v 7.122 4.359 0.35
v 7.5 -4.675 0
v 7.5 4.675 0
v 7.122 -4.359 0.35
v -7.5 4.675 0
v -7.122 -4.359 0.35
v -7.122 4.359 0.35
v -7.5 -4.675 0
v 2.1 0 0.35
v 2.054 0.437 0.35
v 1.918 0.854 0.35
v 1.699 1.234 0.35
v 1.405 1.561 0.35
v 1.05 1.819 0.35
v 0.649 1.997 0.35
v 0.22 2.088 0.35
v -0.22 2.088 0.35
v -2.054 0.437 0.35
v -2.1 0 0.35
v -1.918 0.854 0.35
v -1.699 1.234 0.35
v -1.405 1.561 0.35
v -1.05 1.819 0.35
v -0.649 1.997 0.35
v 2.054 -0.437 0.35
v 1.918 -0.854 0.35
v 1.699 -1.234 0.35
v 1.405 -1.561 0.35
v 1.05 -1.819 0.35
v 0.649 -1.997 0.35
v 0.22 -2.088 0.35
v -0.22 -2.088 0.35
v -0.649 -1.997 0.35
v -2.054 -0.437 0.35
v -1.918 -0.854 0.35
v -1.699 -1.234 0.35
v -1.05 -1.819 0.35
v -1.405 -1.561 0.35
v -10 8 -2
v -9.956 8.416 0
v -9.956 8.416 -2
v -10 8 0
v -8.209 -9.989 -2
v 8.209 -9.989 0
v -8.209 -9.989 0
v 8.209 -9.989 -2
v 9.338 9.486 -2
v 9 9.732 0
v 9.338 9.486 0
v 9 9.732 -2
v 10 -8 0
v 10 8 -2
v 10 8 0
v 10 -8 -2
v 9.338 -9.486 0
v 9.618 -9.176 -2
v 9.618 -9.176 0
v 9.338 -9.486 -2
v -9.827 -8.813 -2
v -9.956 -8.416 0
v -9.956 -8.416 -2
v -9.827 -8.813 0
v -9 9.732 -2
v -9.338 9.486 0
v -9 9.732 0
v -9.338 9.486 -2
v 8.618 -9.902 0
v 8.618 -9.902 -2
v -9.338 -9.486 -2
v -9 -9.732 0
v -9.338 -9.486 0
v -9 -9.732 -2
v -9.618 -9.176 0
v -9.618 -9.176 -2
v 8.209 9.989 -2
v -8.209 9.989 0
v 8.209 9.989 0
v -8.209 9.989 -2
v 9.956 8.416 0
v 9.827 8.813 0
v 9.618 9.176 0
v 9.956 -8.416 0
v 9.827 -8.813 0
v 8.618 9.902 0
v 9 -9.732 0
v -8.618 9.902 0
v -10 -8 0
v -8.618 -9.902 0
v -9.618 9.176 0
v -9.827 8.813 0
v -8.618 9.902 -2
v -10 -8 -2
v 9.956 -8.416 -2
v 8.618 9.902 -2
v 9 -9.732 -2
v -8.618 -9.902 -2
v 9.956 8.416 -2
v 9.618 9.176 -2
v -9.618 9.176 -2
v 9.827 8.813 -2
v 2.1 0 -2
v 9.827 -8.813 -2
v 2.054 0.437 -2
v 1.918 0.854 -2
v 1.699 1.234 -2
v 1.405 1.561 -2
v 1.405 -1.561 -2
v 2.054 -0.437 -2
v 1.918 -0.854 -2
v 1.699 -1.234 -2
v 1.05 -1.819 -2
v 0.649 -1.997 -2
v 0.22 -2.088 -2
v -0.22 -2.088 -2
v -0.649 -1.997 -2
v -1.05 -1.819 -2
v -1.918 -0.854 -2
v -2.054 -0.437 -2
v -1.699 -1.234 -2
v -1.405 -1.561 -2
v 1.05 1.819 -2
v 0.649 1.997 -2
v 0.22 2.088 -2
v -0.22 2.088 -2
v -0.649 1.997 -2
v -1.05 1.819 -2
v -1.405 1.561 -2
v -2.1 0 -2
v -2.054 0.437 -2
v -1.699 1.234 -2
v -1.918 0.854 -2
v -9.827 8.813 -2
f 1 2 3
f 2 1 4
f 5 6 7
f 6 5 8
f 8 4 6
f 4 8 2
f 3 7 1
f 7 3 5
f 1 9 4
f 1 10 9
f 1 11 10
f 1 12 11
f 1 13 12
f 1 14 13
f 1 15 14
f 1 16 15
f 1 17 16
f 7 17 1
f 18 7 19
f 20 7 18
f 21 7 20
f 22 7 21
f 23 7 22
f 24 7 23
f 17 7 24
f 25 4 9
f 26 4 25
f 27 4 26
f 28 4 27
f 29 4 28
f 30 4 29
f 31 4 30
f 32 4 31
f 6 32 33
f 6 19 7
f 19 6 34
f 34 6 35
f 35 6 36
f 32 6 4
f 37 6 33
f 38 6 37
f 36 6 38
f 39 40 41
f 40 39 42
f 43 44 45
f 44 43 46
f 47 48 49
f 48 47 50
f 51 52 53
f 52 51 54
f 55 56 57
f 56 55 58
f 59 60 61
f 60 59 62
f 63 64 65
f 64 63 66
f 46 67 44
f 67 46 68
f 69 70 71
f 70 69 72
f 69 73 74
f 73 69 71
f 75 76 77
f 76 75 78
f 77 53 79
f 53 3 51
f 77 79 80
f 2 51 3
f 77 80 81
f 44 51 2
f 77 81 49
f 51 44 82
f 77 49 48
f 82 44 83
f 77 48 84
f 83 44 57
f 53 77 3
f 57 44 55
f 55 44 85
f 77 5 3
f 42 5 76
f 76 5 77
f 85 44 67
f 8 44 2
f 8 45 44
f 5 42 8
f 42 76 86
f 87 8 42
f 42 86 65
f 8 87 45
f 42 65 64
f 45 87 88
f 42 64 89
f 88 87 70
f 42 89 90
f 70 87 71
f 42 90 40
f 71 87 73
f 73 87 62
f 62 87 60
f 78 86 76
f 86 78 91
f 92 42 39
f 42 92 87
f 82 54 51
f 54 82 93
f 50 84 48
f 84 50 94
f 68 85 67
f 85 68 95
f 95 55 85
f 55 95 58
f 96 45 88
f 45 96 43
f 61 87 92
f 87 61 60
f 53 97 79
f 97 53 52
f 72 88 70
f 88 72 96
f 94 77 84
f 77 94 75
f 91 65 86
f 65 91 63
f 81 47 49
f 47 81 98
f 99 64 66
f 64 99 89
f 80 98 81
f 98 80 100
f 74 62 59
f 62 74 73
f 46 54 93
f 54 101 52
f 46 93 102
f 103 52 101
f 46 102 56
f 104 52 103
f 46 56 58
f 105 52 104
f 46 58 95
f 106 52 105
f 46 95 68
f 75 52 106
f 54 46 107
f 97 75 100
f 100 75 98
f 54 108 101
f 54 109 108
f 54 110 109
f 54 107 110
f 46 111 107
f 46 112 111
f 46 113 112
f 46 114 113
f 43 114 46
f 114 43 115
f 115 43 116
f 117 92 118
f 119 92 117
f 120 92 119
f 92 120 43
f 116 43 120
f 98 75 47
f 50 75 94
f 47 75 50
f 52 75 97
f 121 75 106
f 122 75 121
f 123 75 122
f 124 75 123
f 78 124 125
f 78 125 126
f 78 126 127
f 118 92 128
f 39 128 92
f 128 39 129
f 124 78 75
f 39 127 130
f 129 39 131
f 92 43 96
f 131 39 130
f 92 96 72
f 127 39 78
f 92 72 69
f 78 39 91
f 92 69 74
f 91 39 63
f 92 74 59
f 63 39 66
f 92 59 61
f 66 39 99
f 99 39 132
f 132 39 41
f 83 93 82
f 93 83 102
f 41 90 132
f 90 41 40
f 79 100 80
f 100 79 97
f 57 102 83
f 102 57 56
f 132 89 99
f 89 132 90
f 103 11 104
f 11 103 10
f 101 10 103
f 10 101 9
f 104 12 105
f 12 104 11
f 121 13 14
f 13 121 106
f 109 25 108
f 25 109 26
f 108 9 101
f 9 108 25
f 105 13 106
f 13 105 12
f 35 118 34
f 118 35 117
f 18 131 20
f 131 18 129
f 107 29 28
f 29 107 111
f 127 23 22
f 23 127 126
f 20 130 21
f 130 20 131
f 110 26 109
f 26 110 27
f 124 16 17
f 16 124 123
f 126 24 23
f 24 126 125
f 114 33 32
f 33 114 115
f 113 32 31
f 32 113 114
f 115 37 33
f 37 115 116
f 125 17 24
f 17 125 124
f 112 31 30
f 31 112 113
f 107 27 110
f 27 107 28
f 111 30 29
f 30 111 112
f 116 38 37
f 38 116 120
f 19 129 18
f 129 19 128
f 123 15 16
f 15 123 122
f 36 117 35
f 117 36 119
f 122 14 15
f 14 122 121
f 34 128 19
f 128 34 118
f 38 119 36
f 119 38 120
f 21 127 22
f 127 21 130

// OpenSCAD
// file: library.scad
////////////////////////////////////////////////////////////////////////////////////////////////////
module plate4Point(x,y,z,d){
	hull(){
		color("green") translate([(x/2)-(d/2) ,(y/2) -(d/2),0]) cylinder(h=z, d=d, center=true);
		color("blue")  translate([(x/2)-(d/2) ,-(y/2)+(d/2),0]) cylinder(h=z, d=d, center=true);
		color("red")   translate([-(x/2)+(d/2),(y/2) -(d/2),0]) cylinder(h=z, d=d, center=true);
		color("grey")  translate([-(x/2)+(d/2),-(y/2)+(d/2),0]) cylinder(h=z, d=d, center=true);
	}
}
////////////////////////////////////////////////////////////////////////////////////////////////////
module plate2Point(x,z,d){
	hull(){
		color("green") translate([(x/2) -(d/2),0 ,0]) cylinder(h=z, d=d, center=true);
		color("blue")  translate([-(x/2)+(d/2),0 ,0]) cylinder(h=z, d=d, center=true);
	}
}
////////////////////////////////////////////////////////////////////////////////////////////////////
module triagleSphere(iX, iY, iZ, iD){
	
	halfD = iD/2;
	hull(){
		color("red")		translate([-halfD   , (iY/2)-halfD, halfD]) sphere(d=iD);	
		color("grey")		translate([-iX+halfD, (iY/2)-halfD, halfD]) sphere(d=iD);
		color("green")	translate([-halfD   , (iY/2)-halfD, iZ-halfD]) sphere(d=iD);

		color("red")		translate([-halfD   , -(iY/2)+halfD, halfD]) sphere(d=iD);
		color("grey")		translate([-iX+halfD, -(iY/2)+halfD, halfD]) sphere(d=iD);
		color("green")	translate([-halfD   , -(iY/2)+halfD, iZ-halfD]) sphere(d=iD);
	}
}
////////////////////////////////////////////////////////////////////////////////////////////////////
module cubeSphere(iX, iYm, iZ, iD){

	edgeDiamitor = iD;
	
	hull(){
		for(a=[[1,1,1],[-1,1,1],[1,-1,1],[-1,-1,1],[1,1,-1],[-1,1,-1],[1,-1,-1],[-1,-1,-1]]){
			translate([
				a[0]*((iX/2) -(edgeDiamitor/2)), 
				a[1]*((iYm/2)-(edgeDiamitor/2)), 
				a[2]*((iZ/2) -(edgeDiamitor/2))]) sphere(d=edgeDiamitor);
		}
	}
} 
////////////////////////////////////////////////////////////////////////////////////////////////////
module mText(l, letter_size = 10, letter_height = 4) {
// Use linear_extrude() to make the letters 3D objects as they
// are only 2D shapes when only using text()
	font = "Bitstream Vera Sans:style=Bold" ;
	linear_extrude(height = letter_height) {
		text(l, size = letter_size, font = font, halign = "center", valign = "center", $fn = 16);
	}
}
module roundedTrapezoid(x1=1, y1=1,x2=1, y2=1, z1=1, d1=6){
  hull(){
  // top Right
    translate([-x1,y1,0])
      cylinder(h=z1,d=d1,center=true);
  // Top Left
    translate([-x1,-y1,0])
      cylinder(h=z1,d=d1,center=true);
  // Bottom Right
    translate([-x2,y2,0])
      cylinder(h=z1,d=d1,center=true);
  // Bottom Left
    translate([-x2,-y2,0])
      cylinder(h=z1,d=d1,center=true);
  }
}
// main file
include<library.scad>;

$fn=30;

  vslotRailFiller_offSet=.2;
  
  vslotRailFiller_totalHeigth=1.85;
  vslotRailFiller_heigthCutBy=1.5;
  vslotRailFiller_vslotRailFiller_topWidth=6.2;
  vslotRailFiller_botWidth=9.55;


vslotRailTest();

////////////////////////////////////////////////////////////////////////////////////////////////////
module vslotRailTest(){
  difference(){
    union(){
      color("green") vslotRailFillerShort(15);
      translate([0,0,-1])
        plate4Point(20,20,2,4);
    }
    cylinder(d=4.2,h=10,center=true);
  }
}
////////////////////////////////////////////////////////////////////////////////////////////////////
////////////////////////////////////////////////////////////////////////////////////////////////////
module vslotRailFillerShort(iLength){
  difference(){
    vslotRailFiller(iLength);
    translate([0,0,(vslotRailFiller_totalHeigth*1.5)-vslotRailFiller_heigthCutBy])
      cube([iLength,10,vslotRailFiller_totalHeigth],center=true);
  }
}
////////////////////////////////////////////////////////////////////////////////////////////////////
module vslotRailFiller(iLength){
  
  translate([0,0,(vslotRailFiller_totalHeigth/2)])
	hull(){
// Top
		translate([0,0,vslotRailFiller_totalHeigth/2])
      cube([iLength-4,6.2-vslotRailFiller_offSet,.001],center=true);
// Bot
		translate([0,0,-vslotRailFiller_totalHeigth/2])
			cube([iLength,vslotRailFiller_botWidth-vslotRailFiller_offSet,.001],center=true);
// vslotRailFiller_offSet
		translate([0,0,-(vslotRailFiller_totalHeigth/2)-vslotRailFiller_offSet])
			cube([iLength,vslotRailFiller_botWidth-vslotRailFiller_offSet,.001],center=true);
	}
}
